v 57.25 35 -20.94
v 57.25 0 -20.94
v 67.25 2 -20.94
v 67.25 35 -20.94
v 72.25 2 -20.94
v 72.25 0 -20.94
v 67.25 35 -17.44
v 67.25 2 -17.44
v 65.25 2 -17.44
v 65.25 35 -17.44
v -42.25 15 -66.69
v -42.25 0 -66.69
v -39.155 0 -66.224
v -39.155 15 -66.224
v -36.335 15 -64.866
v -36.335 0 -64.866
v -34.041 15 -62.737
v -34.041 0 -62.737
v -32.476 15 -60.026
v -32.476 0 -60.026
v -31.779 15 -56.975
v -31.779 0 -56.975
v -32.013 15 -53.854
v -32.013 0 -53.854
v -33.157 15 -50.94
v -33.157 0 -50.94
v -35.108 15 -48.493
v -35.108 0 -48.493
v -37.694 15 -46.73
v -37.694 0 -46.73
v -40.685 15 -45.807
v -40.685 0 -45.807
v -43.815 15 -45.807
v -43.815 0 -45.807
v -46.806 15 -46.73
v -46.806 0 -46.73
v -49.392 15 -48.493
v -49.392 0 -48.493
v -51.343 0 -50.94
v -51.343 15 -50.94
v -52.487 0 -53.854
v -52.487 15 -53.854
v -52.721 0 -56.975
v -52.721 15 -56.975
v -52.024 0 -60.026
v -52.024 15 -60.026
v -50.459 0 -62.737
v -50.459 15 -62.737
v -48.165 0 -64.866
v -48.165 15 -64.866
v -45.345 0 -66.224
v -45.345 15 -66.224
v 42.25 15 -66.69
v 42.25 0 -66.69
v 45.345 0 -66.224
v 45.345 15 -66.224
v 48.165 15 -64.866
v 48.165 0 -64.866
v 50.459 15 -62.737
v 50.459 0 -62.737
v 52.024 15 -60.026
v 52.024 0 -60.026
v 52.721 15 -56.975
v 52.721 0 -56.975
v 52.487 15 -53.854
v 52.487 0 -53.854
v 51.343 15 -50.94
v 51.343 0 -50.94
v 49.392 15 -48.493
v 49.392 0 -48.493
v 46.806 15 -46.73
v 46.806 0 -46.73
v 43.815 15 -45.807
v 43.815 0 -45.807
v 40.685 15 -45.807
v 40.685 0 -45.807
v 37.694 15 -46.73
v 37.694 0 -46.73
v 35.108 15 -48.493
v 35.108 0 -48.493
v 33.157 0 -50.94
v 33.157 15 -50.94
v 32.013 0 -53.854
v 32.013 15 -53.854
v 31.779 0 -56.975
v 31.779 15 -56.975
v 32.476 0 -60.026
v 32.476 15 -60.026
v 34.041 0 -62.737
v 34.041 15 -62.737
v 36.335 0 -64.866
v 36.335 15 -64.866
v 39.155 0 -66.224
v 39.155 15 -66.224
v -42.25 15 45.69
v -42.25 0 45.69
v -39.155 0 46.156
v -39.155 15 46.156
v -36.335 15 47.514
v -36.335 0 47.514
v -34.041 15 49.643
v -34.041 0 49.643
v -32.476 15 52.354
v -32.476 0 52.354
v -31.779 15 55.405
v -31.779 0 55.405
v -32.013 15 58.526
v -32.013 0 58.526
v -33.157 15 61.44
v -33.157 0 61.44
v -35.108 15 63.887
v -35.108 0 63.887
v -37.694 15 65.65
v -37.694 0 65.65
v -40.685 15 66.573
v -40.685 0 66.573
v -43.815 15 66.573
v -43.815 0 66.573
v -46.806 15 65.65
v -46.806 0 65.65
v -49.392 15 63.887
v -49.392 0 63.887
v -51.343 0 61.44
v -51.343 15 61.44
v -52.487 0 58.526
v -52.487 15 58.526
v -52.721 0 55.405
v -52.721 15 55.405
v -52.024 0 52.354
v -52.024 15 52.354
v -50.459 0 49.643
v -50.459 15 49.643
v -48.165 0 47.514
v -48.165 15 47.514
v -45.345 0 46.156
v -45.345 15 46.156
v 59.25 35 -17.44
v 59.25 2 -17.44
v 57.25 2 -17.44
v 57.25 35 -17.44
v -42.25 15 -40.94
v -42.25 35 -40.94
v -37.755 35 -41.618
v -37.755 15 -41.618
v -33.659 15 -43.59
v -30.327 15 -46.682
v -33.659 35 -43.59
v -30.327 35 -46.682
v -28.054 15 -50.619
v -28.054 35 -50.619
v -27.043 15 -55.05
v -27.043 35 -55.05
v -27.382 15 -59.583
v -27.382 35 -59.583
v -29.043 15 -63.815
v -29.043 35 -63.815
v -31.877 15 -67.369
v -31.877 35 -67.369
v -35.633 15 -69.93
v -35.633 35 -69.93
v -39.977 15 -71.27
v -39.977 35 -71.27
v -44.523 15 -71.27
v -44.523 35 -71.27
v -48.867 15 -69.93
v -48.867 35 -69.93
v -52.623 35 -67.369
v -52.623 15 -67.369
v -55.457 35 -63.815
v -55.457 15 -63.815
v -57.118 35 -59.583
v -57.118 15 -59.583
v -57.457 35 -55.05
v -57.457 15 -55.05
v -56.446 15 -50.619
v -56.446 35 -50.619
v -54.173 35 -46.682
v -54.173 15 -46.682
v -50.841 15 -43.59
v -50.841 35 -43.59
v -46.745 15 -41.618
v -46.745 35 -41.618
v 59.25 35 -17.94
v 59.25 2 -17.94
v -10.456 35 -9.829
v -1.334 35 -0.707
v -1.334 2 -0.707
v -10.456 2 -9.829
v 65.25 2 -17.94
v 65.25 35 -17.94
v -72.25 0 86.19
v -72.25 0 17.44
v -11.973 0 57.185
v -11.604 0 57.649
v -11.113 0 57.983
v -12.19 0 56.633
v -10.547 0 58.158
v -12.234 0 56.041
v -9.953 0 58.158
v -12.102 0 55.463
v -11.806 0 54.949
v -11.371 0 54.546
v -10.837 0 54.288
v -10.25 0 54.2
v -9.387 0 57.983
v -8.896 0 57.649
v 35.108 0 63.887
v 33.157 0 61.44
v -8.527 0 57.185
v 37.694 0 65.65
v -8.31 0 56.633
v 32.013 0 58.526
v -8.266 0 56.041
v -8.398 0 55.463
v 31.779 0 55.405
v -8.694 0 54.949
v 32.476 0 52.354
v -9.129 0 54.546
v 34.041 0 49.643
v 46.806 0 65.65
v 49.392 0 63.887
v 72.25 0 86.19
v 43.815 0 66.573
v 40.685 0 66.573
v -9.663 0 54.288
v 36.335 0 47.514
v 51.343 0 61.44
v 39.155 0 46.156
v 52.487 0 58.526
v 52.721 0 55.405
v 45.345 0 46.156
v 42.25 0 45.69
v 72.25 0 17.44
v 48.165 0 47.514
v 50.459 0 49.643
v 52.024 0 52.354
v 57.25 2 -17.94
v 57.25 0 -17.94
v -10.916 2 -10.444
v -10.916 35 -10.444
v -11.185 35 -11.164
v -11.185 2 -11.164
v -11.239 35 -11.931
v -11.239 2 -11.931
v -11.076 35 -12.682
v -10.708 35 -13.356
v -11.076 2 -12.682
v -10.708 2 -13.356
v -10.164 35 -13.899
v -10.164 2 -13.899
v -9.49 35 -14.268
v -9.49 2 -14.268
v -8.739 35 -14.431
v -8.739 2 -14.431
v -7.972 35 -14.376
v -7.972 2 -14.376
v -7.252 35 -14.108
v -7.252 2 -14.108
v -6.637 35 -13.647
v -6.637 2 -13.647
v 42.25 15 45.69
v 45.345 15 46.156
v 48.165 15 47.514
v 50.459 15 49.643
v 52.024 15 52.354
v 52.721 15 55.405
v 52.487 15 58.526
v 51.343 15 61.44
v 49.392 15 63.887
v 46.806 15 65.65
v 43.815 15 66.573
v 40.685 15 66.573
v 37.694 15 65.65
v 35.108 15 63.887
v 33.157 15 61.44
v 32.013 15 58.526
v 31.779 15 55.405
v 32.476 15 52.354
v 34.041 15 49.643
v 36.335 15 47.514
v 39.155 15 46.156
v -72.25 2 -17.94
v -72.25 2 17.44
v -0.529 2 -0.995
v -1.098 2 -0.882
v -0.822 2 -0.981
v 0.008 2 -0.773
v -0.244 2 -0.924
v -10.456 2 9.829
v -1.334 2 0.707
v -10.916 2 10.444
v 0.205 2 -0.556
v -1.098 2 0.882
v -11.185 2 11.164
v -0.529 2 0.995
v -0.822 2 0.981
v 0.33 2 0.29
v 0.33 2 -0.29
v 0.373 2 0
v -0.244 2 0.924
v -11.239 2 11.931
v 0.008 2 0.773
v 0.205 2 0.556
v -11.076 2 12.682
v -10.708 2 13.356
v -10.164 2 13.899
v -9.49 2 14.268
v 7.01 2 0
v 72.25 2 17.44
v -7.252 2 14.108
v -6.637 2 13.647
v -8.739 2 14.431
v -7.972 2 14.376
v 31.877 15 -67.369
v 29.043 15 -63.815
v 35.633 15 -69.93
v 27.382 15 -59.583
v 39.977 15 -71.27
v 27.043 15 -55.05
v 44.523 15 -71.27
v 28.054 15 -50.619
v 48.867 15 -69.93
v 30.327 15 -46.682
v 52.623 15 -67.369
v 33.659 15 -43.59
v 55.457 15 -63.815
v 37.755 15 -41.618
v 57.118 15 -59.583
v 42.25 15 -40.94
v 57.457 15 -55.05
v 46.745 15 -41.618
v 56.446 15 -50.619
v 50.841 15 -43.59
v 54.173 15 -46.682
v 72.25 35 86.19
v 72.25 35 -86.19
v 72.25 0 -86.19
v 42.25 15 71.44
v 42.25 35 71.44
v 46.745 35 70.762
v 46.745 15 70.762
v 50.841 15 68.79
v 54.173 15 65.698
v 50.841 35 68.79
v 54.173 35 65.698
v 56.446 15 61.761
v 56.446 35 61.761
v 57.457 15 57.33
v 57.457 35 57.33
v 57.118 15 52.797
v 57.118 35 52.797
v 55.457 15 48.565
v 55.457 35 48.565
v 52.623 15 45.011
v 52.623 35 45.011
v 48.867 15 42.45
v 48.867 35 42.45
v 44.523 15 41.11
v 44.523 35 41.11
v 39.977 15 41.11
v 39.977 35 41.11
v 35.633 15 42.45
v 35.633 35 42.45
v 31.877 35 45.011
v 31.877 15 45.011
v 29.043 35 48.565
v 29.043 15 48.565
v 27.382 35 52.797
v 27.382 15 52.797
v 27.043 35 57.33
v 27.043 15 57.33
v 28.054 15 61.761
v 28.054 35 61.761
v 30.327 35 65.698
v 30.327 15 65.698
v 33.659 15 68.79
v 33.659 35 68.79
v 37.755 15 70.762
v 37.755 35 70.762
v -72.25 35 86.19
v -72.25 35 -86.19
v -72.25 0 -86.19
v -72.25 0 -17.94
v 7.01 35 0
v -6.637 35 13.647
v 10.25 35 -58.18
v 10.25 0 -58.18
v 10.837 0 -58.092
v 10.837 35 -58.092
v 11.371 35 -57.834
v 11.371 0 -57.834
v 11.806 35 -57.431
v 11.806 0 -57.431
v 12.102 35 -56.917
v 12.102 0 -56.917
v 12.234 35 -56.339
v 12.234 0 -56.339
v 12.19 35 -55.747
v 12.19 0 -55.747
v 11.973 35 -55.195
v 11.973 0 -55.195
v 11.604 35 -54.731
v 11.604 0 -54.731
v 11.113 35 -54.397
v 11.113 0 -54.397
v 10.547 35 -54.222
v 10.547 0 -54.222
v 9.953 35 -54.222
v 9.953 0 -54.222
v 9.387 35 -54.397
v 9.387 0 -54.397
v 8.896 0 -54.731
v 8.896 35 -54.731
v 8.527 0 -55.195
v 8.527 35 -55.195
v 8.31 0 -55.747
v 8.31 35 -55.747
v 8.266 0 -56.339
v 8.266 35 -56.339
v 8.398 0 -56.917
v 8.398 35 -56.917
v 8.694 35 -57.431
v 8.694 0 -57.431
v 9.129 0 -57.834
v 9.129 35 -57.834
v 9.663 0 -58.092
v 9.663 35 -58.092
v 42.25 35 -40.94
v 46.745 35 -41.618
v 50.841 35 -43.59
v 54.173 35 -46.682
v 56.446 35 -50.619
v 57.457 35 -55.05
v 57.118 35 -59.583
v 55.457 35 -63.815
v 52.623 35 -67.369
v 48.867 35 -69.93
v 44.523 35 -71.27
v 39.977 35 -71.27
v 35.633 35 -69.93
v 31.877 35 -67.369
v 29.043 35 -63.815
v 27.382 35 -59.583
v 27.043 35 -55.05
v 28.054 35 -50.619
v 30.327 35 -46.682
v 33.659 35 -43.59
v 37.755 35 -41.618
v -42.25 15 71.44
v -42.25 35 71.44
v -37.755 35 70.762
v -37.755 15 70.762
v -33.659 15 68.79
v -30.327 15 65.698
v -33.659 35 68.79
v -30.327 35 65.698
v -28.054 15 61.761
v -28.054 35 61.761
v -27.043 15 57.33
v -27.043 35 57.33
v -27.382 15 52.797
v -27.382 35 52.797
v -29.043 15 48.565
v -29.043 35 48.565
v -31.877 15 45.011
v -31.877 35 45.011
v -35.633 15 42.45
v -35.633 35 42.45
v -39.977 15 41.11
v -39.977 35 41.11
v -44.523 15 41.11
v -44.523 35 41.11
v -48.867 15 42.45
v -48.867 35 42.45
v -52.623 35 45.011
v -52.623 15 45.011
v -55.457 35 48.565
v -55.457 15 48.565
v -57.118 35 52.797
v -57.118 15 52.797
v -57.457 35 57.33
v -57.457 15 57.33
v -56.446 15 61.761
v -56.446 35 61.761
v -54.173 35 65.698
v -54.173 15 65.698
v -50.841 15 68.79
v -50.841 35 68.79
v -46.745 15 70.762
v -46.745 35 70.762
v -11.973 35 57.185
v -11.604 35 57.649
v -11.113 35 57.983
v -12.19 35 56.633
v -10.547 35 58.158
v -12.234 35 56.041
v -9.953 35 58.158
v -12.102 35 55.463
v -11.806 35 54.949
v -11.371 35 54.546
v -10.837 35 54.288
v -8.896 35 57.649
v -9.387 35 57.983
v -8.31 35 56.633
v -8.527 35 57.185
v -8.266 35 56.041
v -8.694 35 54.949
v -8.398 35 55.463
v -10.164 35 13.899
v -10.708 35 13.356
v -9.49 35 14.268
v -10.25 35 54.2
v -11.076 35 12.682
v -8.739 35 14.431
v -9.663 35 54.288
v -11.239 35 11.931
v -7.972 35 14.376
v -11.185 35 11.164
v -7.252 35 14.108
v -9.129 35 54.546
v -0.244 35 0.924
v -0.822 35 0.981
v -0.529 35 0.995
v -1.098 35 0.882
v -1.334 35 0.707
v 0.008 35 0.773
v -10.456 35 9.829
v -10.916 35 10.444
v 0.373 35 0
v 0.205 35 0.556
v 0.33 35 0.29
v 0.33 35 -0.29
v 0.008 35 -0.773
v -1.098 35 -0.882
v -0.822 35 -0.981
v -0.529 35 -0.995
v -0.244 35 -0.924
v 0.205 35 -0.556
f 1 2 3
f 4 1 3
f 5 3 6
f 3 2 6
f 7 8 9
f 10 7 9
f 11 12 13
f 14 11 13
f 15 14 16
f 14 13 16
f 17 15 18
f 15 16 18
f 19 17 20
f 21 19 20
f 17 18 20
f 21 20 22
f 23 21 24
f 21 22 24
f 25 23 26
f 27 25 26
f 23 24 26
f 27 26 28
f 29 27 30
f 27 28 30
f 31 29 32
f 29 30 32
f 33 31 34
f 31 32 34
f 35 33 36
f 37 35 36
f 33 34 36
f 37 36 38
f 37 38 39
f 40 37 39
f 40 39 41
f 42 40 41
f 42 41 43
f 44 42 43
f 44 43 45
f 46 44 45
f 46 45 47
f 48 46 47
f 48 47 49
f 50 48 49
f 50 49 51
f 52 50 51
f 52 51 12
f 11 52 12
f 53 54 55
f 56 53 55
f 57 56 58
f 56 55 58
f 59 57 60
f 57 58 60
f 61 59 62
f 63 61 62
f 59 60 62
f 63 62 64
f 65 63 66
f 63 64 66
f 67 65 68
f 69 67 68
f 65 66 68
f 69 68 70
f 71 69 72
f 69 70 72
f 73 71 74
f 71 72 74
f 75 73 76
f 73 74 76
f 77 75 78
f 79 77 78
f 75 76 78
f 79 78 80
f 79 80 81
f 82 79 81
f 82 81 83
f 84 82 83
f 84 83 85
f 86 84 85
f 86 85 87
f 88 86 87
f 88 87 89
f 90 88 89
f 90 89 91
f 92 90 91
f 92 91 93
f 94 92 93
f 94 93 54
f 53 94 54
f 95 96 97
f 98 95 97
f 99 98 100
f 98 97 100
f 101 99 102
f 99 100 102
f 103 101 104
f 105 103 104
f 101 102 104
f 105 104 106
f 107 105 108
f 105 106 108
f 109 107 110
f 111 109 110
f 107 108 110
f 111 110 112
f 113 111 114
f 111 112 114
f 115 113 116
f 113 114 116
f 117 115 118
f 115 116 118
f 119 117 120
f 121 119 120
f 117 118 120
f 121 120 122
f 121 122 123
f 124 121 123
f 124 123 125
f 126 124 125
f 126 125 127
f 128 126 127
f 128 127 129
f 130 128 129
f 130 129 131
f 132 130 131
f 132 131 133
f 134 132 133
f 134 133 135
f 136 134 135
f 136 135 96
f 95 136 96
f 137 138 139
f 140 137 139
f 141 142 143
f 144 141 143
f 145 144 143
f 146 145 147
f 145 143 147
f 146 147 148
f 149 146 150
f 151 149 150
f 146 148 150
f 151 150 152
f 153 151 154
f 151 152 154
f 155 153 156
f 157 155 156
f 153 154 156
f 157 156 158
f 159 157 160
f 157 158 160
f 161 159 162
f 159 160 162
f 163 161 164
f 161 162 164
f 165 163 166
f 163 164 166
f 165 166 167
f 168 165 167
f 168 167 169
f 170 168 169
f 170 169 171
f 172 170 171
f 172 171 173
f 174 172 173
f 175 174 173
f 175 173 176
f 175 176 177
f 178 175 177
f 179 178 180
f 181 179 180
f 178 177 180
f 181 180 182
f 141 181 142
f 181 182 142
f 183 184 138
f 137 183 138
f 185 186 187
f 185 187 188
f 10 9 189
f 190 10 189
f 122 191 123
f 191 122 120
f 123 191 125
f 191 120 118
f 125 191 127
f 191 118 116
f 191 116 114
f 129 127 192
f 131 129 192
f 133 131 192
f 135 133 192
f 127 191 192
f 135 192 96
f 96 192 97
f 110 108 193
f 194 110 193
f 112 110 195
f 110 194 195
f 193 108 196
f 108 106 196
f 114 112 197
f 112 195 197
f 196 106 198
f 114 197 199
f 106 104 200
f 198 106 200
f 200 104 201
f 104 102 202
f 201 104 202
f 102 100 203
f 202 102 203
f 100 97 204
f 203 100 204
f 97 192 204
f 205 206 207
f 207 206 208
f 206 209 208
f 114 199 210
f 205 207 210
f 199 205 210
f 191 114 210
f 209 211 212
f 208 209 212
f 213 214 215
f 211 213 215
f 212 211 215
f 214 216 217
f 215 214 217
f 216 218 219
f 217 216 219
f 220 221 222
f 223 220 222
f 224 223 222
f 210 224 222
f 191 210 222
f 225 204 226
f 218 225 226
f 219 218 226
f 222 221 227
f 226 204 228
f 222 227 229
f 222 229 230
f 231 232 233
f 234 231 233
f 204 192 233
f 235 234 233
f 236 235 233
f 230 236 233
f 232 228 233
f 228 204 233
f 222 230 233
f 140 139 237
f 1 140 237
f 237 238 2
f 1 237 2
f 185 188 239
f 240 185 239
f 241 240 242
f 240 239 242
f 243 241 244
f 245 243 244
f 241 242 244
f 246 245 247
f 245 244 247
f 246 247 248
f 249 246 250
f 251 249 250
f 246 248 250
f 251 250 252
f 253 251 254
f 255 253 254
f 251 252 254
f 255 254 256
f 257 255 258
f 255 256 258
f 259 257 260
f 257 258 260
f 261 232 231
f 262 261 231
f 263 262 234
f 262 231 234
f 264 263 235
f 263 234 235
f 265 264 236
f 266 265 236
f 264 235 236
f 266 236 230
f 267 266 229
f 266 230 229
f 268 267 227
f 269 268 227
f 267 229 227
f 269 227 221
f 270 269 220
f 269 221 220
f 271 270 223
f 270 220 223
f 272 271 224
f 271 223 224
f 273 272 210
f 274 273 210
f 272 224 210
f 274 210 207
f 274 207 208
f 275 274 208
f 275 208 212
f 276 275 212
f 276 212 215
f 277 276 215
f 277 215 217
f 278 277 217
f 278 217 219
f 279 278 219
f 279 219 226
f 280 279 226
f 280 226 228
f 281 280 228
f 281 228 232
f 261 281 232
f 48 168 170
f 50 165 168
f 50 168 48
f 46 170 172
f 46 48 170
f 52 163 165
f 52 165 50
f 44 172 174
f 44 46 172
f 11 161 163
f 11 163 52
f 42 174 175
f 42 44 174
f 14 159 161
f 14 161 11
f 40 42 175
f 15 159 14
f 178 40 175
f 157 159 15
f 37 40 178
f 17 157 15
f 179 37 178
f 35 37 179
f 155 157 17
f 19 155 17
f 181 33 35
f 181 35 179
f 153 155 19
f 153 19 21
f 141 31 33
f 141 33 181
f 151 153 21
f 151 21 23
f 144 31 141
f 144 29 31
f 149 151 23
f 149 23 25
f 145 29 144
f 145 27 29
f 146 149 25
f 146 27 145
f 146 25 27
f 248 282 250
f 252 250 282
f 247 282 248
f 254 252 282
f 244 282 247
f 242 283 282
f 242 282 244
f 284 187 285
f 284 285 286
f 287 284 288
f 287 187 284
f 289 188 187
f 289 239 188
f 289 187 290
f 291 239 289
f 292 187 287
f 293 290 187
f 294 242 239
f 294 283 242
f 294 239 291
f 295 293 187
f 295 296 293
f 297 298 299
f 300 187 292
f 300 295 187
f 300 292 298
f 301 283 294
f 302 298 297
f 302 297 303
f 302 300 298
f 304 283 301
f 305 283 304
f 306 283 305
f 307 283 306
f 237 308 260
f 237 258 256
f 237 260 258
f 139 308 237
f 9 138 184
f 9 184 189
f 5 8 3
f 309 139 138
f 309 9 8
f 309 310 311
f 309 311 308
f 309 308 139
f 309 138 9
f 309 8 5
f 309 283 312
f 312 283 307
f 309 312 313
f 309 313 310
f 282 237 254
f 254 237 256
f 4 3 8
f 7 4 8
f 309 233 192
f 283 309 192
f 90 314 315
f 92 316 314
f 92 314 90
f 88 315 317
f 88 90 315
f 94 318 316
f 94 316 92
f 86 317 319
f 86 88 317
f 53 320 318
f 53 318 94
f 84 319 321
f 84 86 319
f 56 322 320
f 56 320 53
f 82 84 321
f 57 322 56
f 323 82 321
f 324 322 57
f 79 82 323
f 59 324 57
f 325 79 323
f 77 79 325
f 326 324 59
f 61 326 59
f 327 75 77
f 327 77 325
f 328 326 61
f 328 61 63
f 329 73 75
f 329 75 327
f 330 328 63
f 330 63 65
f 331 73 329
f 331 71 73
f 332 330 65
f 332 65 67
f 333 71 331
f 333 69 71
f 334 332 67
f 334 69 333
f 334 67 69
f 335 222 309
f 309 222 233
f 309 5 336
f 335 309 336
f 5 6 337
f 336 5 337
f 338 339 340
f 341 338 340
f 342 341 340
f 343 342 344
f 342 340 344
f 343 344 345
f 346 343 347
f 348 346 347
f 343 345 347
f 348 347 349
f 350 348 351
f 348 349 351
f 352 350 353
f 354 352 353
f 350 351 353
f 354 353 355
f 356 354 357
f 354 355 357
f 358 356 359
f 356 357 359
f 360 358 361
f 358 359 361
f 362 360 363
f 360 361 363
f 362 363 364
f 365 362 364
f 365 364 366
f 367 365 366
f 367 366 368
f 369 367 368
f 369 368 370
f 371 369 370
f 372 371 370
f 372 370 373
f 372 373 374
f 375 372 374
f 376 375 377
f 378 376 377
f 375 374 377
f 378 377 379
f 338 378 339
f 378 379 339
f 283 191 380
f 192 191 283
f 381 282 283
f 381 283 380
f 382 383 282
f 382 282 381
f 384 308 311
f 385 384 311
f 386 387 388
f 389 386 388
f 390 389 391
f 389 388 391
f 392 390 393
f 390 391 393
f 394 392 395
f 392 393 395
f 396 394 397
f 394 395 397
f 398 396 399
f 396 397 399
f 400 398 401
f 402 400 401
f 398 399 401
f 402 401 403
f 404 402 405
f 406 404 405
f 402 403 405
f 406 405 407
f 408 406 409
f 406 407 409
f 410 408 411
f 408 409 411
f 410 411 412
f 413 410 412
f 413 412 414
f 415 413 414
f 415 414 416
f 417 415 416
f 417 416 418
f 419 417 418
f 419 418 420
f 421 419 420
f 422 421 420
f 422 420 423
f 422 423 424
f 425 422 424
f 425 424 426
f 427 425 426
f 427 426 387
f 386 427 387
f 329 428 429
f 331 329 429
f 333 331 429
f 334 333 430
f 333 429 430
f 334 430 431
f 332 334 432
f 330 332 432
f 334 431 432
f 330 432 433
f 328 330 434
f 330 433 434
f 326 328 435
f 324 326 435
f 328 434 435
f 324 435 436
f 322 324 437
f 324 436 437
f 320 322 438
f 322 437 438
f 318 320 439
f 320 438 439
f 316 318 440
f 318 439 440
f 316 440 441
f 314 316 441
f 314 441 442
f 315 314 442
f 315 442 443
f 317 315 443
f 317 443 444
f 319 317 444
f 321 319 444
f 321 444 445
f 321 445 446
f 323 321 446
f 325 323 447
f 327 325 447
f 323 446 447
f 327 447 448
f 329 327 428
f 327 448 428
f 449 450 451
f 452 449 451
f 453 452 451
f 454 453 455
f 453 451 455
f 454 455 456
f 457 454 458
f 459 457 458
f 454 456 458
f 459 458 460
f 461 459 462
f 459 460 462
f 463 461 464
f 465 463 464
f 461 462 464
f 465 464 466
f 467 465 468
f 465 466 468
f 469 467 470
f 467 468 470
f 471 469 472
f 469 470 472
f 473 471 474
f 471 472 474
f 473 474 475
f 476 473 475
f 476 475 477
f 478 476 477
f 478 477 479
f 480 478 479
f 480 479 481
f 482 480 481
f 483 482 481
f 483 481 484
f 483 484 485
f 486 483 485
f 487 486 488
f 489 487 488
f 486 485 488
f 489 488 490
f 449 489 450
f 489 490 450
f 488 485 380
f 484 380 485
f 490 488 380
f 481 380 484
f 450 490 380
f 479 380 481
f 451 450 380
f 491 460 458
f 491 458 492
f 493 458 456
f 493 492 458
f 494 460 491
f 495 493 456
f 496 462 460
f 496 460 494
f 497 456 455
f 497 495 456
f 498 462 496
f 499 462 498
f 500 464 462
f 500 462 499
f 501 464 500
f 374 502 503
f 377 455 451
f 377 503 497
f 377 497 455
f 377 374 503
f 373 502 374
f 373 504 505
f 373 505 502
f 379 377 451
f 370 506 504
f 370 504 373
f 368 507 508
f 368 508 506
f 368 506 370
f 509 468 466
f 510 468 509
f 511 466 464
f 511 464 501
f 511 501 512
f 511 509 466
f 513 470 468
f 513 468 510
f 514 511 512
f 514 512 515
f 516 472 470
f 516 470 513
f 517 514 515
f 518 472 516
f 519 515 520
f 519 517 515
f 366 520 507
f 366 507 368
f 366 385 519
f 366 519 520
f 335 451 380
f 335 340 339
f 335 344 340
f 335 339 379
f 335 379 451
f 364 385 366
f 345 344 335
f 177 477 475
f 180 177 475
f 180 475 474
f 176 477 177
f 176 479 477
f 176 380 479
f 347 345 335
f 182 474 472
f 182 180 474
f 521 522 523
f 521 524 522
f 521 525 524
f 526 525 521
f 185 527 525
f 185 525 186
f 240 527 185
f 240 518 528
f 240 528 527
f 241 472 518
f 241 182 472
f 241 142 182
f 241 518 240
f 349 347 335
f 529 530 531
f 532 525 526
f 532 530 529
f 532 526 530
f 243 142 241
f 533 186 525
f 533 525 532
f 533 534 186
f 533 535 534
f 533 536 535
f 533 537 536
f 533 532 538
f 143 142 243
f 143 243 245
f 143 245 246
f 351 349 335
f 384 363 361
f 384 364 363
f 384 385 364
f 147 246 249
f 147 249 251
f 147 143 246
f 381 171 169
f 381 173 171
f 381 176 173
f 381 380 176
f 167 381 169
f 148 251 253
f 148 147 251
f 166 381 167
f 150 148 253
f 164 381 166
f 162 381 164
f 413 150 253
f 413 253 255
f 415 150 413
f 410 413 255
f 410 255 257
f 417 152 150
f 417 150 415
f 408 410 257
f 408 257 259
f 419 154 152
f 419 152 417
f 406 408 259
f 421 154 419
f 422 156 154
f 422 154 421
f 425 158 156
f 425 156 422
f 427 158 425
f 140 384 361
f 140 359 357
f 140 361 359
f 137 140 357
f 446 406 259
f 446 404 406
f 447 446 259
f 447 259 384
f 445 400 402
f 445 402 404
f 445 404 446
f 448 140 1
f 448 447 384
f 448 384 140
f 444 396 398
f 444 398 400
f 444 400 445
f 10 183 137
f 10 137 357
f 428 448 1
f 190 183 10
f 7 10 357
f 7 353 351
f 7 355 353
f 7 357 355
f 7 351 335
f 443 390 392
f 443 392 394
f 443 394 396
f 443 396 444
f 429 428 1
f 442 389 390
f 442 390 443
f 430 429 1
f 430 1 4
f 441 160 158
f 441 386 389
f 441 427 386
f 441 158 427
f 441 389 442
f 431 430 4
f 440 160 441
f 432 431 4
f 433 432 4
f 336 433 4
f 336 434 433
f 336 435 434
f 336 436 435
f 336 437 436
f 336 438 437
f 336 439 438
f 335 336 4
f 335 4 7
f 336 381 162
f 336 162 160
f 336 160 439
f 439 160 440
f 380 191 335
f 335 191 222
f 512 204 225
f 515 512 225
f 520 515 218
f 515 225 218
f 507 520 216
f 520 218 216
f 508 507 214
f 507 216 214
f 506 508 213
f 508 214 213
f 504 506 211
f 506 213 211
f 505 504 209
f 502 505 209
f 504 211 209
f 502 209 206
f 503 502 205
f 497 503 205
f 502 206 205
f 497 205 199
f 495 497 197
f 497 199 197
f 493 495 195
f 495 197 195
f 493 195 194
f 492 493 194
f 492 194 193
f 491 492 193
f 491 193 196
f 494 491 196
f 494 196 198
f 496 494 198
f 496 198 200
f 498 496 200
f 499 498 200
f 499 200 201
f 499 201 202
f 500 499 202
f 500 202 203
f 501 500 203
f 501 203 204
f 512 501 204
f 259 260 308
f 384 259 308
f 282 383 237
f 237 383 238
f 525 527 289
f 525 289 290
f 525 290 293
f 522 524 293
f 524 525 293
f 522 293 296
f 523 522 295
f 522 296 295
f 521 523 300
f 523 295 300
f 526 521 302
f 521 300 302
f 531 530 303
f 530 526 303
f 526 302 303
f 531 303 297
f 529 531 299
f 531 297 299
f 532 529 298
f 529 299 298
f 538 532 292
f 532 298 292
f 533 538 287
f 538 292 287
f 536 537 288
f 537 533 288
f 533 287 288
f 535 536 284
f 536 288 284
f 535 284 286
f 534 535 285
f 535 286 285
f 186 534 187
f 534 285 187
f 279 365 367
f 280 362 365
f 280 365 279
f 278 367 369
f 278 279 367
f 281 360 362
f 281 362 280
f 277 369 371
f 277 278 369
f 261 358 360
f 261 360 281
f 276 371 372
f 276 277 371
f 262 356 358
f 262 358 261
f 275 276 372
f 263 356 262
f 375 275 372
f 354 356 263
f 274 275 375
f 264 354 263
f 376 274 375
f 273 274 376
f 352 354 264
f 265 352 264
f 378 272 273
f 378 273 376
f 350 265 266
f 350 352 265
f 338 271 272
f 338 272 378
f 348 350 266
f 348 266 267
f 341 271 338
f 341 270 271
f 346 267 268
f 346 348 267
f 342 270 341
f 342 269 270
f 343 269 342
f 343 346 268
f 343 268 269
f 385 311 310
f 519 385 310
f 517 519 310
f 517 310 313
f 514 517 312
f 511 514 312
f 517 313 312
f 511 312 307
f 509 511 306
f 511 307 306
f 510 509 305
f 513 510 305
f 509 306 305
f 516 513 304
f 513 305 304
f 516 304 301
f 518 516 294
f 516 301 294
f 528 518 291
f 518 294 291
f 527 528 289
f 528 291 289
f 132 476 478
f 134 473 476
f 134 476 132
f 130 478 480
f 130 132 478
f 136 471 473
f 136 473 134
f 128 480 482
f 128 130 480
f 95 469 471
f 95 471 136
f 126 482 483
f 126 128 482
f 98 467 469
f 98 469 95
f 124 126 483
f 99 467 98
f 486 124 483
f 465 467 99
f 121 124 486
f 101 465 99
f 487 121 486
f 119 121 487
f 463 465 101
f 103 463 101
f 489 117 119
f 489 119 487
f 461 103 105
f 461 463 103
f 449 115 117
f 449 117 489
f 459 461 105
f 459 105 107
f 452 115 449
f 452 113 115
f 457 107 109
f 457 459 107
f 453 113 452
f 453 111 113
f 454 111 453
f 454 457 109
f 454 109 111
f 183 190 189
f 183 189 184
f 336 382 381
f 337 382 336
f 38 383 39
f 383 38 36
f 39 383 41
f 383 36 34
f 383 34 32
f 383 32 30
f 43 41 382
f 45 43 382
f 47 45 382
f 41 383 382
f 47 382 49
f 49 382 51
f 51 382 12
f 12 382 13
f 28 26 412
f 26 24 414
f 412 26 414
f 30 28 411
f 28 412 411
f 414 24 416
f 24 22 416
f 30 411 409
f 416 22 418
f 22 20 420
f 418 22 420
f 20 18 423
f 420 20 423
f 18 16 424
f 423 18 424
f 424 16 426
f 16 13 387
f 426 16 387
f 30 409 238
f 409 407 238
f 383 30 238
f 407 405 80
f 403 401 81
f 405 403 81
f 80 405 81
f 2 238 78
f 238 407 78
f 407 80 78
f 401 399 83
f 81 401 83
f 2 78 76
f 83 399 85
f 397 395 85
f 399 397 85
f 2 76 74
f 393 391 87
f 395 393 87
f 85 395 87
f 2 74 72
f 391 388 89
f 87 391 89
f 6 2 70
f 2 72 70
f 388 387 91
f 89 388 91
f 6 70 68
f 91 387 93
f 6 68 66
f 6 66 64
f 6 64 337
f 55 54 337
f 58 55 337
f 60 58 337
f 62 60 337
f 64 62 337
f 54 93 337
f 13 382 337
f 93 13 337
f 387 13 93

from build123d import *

# Parameters (mm, degrees)
SKETCH1_W           = 144.5
SKETCH1_H           = 172.38
BOSS_EXTRUDE1_DEPTH = 35
CUT_EXTRUDE1_REACH  = 119.787
SKETCH2_R           = 1.99
SKETCH2_R_2         = 10.5
CUT_EXTRUDE2_DEPTH  = 2
SKETCH4_R           = 15.25
CUT_EXTRUDE3_DEPTH  = 20


with BuildPart() as part:
    # Sketch1 → Boss-Extrude1 (new body)
    with BuildSketch(Plane(origin=(0, 0, 0), x_dir=(1, 0, 0), z_dir=(0, 1, 0))):
        Rectangle(SKETCH1_W, SKETCH1_H)
    extrude(amount=BOSS_EXTRUDE1_DEPTH)

    # Sketch2 → Cut-Extrude1 (cut, up to next)
    with BuildSketch(Plane.XZ, mode=Mode.PRIVATE) as cut_extrude1_sk1:
        with Locations(Location((10.25, -56.19, 0), (0, 0, 270))):
            Circle(SKETCH2_R)
    cut_extrude1_tool1 = extrude(cut_extrude1_sk1.sketch, amount=-CUT_EXTRUDE1_REACH, mode=Mode.PRIVATE) & part.part
    # Sketch2 → Cut-Extrude1 (cut, up to next)
    with BuildSketch(Plane.XZ, mode=Mode.PRIVATE) as cut_extrude1_sk2:
        with Locations(Location((-42.25, -56.19, 0), (0, 0, 270))):
            Circle(SKETCH2_R_2)
    cut_extrude1_tool2 = extrude(cut_extrude1_sk2.sketch, amount=-CUT_EXTRUDE1_REACH, mode=Mode.PRIVATE) & part.part
    # Sketch2 → Cut-Extrude1 (cut, up to next)
    with BuildSketch(Plane.XZ, mode=Mode.PRIVATE) as cut_extrude1_sk3:
        with Locations(Location((42.25, -56.19, 0), (0, 0, 270))):
            Circle(SKETCH2_R_2)
    cut_extrude1_tool3 = extrude(cut_extrude1_sk3.sketch, amount=-CUT_EXTRUDE1_REACH, mode=Mode.PRIVATE) & part.part
    # Sketch2 → Cut-Extrude1 (cut, up to next)
    with BuildSketch(Plane.XZ, mode=Mode.PRIVATE) as cut_extrude1_sk4:
        with Locations(Location((-42.25, 56.19, 0), (0, 0, 270))):
            Circle(SKETCH2_R_2)
    cut_extrude1_tool4 = extrude(cut_extrude1_sk4.sketch, amount=-CUT_EXTRUDE1_REACH, mode=Mode.PRIVATE) & part.part
    # Sketch2 → Cut-Extrude1 (cut, up to next)
    with BuildSketch(Plane.XZ, mode=Mode.PRIVATE) as cut_extrude1_sk5:
        with Locations(Location((-10.25, 56.19, 0), (0, 0, 270))):
            Circle(SKETCH2_R)
    cut_extrude1_tool5 = extrude(cut_extrude1_sk5.sketch, amount=-CUT_EXTRUDE1_REACH, mode=Mode.PRIVATE) & part.part
    # Sketch2 → Cut-Extrude1 (cut, up to next)
    with BuildSketch(Plane.XZ, mode=Mode.PRIVATE) as cut_extrude1_sk6:
        with Locations(Location((42.25, 56.19, 0), (0, 0, 270))):
            Circle(SKETCH2_R_2)
    cut_extrude1_tool6 = extrude(cut_extrude1_sk6.sketch, amount=-CUT_EXTRUDE1_REACH, mode=Mode.PRIVATE) & part.part
    # Sketch2 → Cut-Extrude1 (cut, up to next)
    with BuildSketch(Plane.XZ, mode=Mode.PRIVATE) as cut_extrude1_sk7:
        Polygon((57.25, -20.94), (67.25, -20.94), (67.25, -17.44), (65.25, -17.44), (65.25, -17.94), (59.25, -17.94), (59.25, -17.44), (57.25, -17.44), align=None)
    cut_extrude1_tool7 = extrude(cut_extrude1_sk7.sketch, amount=-CUT_EXTRUDE1_REACH, mode=Mode.PRIVATE) & part.part
    # Sketch2 → Cut-Extrude1 (cut, up to next)
    with BuildSketch(Plane.XZ, mode=Mode.PRIVATE) as cut_extrude1_sk8:
        with BuildLine():
            Line((-1.333860018, -0.707106781), (-10.455537495, -9.828784258))
            ThreePointArc((-10.455537495, -9.828784258), (-10.455537495, -13.647160877), (-6.637160877, -13.647160877))
            Line((-6.637160877, -13.647160877), (7.01, 0))
            Line((7.01, 0), (-6.637160877, 13.647160877))
            ThreePointArc((-6.637160877, 13.647160877), (-10.455537495, 13.647160877), (-10.455537495, 9.828784258))
            Line((-10.455537495, 9.828784258), (-1.333860018, 0.707106781))
            ThreePointArc((-1.333860018, 0.707106781), (0.373246763, 0), (-1.333860018, -0.707106781))
        make_face()
    cut_extrude1_tool8 = extrude(cut_extrude1_sk8.sketch, amount=-CUT_EXTRUDE1_REACH, mode=Mode.PRIVATE) & part.part
    add(cut_extrude1_tool1.solids().sort_by_distance((10.25, 0, -56.19))[0], mode=Mode.SUBTRACT)
    add(cut_extrude1_tool2.solids().sort_by_distance((-42.25, 0, -56.19))[0], mode=Mode.SUBTRACT)
    add(cut_extrude1_tool3.solids().sort_by_distance((42.25, 0, -56.19))[0], mode=Mode.SUBTRACT)
    add(cut_extrude1_tool4.solids().sort_by_distance((-42.25, 0, 56.19))[0], mode=Mode.SUBTRACT)
    add(cut_extrude1_tool5.solids().sort_by_distance((-10.25, 0, 56.19))[0], mode=Mode.SUBTRACT)
    add(cut_extrude1_tool6.solids().sort_by_distance((42.25, 0, 56.19))[0], mode=Mode.SUBTRACT)
    add(cut_extrude1_tool7.solids().sort_by_distance((62.25, 0, -19.330625))[0], mode=Mode.SUBTRACT)
    add(cut_extrude1_tool8.solids().sort_by_distance((-0.05515, 0, -6.582011))[0], mode=Mode.SUBTRACT)

    # Sketch3 → Cut-Extrude2 (cut)
    with BuildSketch(Plane.XZ):
        Polygon((-72.25, 17.44), (-72.25, -17.94), (57.25, -17.94), (57.25, -20.94), (72.25, -20.94), (72.25, -19.644727293), (72.25, 17.44), align=None)
    extrude(amount=-CUT_EXTRUDE2_DEPTH, mode=Mode.SUBTRACT)

    # Sketch4 → Cut-Extrude3 (cut)
    with BuildSketch(Plane(origin=(0, 35, 0), x_dir=(1, 0, 0), z_dir=(0, 1, 0))):
        with Locations(Location((-42.25, 56.19, 0), (0, 0, 270))):
            Circle(SKETCH4_R)
        with Locations(Location((42.25, 56.19, 0), (0, 0, 270))):
            Circle(SKETCH4_R)
        with Locations(Location((42.25, -56.19, 0), (0, 0, 270))):
            Circle(SKETCH4_R)
        with Locations(Location((-42.25, -56.19, 0), (0, 0, 270))):
            Circle(SKETCH4_R)
    extrude(amount=-CUT_EXTRUDE3_DEPTH, mode=Mode.SUBTRACT)


solid = part.part
